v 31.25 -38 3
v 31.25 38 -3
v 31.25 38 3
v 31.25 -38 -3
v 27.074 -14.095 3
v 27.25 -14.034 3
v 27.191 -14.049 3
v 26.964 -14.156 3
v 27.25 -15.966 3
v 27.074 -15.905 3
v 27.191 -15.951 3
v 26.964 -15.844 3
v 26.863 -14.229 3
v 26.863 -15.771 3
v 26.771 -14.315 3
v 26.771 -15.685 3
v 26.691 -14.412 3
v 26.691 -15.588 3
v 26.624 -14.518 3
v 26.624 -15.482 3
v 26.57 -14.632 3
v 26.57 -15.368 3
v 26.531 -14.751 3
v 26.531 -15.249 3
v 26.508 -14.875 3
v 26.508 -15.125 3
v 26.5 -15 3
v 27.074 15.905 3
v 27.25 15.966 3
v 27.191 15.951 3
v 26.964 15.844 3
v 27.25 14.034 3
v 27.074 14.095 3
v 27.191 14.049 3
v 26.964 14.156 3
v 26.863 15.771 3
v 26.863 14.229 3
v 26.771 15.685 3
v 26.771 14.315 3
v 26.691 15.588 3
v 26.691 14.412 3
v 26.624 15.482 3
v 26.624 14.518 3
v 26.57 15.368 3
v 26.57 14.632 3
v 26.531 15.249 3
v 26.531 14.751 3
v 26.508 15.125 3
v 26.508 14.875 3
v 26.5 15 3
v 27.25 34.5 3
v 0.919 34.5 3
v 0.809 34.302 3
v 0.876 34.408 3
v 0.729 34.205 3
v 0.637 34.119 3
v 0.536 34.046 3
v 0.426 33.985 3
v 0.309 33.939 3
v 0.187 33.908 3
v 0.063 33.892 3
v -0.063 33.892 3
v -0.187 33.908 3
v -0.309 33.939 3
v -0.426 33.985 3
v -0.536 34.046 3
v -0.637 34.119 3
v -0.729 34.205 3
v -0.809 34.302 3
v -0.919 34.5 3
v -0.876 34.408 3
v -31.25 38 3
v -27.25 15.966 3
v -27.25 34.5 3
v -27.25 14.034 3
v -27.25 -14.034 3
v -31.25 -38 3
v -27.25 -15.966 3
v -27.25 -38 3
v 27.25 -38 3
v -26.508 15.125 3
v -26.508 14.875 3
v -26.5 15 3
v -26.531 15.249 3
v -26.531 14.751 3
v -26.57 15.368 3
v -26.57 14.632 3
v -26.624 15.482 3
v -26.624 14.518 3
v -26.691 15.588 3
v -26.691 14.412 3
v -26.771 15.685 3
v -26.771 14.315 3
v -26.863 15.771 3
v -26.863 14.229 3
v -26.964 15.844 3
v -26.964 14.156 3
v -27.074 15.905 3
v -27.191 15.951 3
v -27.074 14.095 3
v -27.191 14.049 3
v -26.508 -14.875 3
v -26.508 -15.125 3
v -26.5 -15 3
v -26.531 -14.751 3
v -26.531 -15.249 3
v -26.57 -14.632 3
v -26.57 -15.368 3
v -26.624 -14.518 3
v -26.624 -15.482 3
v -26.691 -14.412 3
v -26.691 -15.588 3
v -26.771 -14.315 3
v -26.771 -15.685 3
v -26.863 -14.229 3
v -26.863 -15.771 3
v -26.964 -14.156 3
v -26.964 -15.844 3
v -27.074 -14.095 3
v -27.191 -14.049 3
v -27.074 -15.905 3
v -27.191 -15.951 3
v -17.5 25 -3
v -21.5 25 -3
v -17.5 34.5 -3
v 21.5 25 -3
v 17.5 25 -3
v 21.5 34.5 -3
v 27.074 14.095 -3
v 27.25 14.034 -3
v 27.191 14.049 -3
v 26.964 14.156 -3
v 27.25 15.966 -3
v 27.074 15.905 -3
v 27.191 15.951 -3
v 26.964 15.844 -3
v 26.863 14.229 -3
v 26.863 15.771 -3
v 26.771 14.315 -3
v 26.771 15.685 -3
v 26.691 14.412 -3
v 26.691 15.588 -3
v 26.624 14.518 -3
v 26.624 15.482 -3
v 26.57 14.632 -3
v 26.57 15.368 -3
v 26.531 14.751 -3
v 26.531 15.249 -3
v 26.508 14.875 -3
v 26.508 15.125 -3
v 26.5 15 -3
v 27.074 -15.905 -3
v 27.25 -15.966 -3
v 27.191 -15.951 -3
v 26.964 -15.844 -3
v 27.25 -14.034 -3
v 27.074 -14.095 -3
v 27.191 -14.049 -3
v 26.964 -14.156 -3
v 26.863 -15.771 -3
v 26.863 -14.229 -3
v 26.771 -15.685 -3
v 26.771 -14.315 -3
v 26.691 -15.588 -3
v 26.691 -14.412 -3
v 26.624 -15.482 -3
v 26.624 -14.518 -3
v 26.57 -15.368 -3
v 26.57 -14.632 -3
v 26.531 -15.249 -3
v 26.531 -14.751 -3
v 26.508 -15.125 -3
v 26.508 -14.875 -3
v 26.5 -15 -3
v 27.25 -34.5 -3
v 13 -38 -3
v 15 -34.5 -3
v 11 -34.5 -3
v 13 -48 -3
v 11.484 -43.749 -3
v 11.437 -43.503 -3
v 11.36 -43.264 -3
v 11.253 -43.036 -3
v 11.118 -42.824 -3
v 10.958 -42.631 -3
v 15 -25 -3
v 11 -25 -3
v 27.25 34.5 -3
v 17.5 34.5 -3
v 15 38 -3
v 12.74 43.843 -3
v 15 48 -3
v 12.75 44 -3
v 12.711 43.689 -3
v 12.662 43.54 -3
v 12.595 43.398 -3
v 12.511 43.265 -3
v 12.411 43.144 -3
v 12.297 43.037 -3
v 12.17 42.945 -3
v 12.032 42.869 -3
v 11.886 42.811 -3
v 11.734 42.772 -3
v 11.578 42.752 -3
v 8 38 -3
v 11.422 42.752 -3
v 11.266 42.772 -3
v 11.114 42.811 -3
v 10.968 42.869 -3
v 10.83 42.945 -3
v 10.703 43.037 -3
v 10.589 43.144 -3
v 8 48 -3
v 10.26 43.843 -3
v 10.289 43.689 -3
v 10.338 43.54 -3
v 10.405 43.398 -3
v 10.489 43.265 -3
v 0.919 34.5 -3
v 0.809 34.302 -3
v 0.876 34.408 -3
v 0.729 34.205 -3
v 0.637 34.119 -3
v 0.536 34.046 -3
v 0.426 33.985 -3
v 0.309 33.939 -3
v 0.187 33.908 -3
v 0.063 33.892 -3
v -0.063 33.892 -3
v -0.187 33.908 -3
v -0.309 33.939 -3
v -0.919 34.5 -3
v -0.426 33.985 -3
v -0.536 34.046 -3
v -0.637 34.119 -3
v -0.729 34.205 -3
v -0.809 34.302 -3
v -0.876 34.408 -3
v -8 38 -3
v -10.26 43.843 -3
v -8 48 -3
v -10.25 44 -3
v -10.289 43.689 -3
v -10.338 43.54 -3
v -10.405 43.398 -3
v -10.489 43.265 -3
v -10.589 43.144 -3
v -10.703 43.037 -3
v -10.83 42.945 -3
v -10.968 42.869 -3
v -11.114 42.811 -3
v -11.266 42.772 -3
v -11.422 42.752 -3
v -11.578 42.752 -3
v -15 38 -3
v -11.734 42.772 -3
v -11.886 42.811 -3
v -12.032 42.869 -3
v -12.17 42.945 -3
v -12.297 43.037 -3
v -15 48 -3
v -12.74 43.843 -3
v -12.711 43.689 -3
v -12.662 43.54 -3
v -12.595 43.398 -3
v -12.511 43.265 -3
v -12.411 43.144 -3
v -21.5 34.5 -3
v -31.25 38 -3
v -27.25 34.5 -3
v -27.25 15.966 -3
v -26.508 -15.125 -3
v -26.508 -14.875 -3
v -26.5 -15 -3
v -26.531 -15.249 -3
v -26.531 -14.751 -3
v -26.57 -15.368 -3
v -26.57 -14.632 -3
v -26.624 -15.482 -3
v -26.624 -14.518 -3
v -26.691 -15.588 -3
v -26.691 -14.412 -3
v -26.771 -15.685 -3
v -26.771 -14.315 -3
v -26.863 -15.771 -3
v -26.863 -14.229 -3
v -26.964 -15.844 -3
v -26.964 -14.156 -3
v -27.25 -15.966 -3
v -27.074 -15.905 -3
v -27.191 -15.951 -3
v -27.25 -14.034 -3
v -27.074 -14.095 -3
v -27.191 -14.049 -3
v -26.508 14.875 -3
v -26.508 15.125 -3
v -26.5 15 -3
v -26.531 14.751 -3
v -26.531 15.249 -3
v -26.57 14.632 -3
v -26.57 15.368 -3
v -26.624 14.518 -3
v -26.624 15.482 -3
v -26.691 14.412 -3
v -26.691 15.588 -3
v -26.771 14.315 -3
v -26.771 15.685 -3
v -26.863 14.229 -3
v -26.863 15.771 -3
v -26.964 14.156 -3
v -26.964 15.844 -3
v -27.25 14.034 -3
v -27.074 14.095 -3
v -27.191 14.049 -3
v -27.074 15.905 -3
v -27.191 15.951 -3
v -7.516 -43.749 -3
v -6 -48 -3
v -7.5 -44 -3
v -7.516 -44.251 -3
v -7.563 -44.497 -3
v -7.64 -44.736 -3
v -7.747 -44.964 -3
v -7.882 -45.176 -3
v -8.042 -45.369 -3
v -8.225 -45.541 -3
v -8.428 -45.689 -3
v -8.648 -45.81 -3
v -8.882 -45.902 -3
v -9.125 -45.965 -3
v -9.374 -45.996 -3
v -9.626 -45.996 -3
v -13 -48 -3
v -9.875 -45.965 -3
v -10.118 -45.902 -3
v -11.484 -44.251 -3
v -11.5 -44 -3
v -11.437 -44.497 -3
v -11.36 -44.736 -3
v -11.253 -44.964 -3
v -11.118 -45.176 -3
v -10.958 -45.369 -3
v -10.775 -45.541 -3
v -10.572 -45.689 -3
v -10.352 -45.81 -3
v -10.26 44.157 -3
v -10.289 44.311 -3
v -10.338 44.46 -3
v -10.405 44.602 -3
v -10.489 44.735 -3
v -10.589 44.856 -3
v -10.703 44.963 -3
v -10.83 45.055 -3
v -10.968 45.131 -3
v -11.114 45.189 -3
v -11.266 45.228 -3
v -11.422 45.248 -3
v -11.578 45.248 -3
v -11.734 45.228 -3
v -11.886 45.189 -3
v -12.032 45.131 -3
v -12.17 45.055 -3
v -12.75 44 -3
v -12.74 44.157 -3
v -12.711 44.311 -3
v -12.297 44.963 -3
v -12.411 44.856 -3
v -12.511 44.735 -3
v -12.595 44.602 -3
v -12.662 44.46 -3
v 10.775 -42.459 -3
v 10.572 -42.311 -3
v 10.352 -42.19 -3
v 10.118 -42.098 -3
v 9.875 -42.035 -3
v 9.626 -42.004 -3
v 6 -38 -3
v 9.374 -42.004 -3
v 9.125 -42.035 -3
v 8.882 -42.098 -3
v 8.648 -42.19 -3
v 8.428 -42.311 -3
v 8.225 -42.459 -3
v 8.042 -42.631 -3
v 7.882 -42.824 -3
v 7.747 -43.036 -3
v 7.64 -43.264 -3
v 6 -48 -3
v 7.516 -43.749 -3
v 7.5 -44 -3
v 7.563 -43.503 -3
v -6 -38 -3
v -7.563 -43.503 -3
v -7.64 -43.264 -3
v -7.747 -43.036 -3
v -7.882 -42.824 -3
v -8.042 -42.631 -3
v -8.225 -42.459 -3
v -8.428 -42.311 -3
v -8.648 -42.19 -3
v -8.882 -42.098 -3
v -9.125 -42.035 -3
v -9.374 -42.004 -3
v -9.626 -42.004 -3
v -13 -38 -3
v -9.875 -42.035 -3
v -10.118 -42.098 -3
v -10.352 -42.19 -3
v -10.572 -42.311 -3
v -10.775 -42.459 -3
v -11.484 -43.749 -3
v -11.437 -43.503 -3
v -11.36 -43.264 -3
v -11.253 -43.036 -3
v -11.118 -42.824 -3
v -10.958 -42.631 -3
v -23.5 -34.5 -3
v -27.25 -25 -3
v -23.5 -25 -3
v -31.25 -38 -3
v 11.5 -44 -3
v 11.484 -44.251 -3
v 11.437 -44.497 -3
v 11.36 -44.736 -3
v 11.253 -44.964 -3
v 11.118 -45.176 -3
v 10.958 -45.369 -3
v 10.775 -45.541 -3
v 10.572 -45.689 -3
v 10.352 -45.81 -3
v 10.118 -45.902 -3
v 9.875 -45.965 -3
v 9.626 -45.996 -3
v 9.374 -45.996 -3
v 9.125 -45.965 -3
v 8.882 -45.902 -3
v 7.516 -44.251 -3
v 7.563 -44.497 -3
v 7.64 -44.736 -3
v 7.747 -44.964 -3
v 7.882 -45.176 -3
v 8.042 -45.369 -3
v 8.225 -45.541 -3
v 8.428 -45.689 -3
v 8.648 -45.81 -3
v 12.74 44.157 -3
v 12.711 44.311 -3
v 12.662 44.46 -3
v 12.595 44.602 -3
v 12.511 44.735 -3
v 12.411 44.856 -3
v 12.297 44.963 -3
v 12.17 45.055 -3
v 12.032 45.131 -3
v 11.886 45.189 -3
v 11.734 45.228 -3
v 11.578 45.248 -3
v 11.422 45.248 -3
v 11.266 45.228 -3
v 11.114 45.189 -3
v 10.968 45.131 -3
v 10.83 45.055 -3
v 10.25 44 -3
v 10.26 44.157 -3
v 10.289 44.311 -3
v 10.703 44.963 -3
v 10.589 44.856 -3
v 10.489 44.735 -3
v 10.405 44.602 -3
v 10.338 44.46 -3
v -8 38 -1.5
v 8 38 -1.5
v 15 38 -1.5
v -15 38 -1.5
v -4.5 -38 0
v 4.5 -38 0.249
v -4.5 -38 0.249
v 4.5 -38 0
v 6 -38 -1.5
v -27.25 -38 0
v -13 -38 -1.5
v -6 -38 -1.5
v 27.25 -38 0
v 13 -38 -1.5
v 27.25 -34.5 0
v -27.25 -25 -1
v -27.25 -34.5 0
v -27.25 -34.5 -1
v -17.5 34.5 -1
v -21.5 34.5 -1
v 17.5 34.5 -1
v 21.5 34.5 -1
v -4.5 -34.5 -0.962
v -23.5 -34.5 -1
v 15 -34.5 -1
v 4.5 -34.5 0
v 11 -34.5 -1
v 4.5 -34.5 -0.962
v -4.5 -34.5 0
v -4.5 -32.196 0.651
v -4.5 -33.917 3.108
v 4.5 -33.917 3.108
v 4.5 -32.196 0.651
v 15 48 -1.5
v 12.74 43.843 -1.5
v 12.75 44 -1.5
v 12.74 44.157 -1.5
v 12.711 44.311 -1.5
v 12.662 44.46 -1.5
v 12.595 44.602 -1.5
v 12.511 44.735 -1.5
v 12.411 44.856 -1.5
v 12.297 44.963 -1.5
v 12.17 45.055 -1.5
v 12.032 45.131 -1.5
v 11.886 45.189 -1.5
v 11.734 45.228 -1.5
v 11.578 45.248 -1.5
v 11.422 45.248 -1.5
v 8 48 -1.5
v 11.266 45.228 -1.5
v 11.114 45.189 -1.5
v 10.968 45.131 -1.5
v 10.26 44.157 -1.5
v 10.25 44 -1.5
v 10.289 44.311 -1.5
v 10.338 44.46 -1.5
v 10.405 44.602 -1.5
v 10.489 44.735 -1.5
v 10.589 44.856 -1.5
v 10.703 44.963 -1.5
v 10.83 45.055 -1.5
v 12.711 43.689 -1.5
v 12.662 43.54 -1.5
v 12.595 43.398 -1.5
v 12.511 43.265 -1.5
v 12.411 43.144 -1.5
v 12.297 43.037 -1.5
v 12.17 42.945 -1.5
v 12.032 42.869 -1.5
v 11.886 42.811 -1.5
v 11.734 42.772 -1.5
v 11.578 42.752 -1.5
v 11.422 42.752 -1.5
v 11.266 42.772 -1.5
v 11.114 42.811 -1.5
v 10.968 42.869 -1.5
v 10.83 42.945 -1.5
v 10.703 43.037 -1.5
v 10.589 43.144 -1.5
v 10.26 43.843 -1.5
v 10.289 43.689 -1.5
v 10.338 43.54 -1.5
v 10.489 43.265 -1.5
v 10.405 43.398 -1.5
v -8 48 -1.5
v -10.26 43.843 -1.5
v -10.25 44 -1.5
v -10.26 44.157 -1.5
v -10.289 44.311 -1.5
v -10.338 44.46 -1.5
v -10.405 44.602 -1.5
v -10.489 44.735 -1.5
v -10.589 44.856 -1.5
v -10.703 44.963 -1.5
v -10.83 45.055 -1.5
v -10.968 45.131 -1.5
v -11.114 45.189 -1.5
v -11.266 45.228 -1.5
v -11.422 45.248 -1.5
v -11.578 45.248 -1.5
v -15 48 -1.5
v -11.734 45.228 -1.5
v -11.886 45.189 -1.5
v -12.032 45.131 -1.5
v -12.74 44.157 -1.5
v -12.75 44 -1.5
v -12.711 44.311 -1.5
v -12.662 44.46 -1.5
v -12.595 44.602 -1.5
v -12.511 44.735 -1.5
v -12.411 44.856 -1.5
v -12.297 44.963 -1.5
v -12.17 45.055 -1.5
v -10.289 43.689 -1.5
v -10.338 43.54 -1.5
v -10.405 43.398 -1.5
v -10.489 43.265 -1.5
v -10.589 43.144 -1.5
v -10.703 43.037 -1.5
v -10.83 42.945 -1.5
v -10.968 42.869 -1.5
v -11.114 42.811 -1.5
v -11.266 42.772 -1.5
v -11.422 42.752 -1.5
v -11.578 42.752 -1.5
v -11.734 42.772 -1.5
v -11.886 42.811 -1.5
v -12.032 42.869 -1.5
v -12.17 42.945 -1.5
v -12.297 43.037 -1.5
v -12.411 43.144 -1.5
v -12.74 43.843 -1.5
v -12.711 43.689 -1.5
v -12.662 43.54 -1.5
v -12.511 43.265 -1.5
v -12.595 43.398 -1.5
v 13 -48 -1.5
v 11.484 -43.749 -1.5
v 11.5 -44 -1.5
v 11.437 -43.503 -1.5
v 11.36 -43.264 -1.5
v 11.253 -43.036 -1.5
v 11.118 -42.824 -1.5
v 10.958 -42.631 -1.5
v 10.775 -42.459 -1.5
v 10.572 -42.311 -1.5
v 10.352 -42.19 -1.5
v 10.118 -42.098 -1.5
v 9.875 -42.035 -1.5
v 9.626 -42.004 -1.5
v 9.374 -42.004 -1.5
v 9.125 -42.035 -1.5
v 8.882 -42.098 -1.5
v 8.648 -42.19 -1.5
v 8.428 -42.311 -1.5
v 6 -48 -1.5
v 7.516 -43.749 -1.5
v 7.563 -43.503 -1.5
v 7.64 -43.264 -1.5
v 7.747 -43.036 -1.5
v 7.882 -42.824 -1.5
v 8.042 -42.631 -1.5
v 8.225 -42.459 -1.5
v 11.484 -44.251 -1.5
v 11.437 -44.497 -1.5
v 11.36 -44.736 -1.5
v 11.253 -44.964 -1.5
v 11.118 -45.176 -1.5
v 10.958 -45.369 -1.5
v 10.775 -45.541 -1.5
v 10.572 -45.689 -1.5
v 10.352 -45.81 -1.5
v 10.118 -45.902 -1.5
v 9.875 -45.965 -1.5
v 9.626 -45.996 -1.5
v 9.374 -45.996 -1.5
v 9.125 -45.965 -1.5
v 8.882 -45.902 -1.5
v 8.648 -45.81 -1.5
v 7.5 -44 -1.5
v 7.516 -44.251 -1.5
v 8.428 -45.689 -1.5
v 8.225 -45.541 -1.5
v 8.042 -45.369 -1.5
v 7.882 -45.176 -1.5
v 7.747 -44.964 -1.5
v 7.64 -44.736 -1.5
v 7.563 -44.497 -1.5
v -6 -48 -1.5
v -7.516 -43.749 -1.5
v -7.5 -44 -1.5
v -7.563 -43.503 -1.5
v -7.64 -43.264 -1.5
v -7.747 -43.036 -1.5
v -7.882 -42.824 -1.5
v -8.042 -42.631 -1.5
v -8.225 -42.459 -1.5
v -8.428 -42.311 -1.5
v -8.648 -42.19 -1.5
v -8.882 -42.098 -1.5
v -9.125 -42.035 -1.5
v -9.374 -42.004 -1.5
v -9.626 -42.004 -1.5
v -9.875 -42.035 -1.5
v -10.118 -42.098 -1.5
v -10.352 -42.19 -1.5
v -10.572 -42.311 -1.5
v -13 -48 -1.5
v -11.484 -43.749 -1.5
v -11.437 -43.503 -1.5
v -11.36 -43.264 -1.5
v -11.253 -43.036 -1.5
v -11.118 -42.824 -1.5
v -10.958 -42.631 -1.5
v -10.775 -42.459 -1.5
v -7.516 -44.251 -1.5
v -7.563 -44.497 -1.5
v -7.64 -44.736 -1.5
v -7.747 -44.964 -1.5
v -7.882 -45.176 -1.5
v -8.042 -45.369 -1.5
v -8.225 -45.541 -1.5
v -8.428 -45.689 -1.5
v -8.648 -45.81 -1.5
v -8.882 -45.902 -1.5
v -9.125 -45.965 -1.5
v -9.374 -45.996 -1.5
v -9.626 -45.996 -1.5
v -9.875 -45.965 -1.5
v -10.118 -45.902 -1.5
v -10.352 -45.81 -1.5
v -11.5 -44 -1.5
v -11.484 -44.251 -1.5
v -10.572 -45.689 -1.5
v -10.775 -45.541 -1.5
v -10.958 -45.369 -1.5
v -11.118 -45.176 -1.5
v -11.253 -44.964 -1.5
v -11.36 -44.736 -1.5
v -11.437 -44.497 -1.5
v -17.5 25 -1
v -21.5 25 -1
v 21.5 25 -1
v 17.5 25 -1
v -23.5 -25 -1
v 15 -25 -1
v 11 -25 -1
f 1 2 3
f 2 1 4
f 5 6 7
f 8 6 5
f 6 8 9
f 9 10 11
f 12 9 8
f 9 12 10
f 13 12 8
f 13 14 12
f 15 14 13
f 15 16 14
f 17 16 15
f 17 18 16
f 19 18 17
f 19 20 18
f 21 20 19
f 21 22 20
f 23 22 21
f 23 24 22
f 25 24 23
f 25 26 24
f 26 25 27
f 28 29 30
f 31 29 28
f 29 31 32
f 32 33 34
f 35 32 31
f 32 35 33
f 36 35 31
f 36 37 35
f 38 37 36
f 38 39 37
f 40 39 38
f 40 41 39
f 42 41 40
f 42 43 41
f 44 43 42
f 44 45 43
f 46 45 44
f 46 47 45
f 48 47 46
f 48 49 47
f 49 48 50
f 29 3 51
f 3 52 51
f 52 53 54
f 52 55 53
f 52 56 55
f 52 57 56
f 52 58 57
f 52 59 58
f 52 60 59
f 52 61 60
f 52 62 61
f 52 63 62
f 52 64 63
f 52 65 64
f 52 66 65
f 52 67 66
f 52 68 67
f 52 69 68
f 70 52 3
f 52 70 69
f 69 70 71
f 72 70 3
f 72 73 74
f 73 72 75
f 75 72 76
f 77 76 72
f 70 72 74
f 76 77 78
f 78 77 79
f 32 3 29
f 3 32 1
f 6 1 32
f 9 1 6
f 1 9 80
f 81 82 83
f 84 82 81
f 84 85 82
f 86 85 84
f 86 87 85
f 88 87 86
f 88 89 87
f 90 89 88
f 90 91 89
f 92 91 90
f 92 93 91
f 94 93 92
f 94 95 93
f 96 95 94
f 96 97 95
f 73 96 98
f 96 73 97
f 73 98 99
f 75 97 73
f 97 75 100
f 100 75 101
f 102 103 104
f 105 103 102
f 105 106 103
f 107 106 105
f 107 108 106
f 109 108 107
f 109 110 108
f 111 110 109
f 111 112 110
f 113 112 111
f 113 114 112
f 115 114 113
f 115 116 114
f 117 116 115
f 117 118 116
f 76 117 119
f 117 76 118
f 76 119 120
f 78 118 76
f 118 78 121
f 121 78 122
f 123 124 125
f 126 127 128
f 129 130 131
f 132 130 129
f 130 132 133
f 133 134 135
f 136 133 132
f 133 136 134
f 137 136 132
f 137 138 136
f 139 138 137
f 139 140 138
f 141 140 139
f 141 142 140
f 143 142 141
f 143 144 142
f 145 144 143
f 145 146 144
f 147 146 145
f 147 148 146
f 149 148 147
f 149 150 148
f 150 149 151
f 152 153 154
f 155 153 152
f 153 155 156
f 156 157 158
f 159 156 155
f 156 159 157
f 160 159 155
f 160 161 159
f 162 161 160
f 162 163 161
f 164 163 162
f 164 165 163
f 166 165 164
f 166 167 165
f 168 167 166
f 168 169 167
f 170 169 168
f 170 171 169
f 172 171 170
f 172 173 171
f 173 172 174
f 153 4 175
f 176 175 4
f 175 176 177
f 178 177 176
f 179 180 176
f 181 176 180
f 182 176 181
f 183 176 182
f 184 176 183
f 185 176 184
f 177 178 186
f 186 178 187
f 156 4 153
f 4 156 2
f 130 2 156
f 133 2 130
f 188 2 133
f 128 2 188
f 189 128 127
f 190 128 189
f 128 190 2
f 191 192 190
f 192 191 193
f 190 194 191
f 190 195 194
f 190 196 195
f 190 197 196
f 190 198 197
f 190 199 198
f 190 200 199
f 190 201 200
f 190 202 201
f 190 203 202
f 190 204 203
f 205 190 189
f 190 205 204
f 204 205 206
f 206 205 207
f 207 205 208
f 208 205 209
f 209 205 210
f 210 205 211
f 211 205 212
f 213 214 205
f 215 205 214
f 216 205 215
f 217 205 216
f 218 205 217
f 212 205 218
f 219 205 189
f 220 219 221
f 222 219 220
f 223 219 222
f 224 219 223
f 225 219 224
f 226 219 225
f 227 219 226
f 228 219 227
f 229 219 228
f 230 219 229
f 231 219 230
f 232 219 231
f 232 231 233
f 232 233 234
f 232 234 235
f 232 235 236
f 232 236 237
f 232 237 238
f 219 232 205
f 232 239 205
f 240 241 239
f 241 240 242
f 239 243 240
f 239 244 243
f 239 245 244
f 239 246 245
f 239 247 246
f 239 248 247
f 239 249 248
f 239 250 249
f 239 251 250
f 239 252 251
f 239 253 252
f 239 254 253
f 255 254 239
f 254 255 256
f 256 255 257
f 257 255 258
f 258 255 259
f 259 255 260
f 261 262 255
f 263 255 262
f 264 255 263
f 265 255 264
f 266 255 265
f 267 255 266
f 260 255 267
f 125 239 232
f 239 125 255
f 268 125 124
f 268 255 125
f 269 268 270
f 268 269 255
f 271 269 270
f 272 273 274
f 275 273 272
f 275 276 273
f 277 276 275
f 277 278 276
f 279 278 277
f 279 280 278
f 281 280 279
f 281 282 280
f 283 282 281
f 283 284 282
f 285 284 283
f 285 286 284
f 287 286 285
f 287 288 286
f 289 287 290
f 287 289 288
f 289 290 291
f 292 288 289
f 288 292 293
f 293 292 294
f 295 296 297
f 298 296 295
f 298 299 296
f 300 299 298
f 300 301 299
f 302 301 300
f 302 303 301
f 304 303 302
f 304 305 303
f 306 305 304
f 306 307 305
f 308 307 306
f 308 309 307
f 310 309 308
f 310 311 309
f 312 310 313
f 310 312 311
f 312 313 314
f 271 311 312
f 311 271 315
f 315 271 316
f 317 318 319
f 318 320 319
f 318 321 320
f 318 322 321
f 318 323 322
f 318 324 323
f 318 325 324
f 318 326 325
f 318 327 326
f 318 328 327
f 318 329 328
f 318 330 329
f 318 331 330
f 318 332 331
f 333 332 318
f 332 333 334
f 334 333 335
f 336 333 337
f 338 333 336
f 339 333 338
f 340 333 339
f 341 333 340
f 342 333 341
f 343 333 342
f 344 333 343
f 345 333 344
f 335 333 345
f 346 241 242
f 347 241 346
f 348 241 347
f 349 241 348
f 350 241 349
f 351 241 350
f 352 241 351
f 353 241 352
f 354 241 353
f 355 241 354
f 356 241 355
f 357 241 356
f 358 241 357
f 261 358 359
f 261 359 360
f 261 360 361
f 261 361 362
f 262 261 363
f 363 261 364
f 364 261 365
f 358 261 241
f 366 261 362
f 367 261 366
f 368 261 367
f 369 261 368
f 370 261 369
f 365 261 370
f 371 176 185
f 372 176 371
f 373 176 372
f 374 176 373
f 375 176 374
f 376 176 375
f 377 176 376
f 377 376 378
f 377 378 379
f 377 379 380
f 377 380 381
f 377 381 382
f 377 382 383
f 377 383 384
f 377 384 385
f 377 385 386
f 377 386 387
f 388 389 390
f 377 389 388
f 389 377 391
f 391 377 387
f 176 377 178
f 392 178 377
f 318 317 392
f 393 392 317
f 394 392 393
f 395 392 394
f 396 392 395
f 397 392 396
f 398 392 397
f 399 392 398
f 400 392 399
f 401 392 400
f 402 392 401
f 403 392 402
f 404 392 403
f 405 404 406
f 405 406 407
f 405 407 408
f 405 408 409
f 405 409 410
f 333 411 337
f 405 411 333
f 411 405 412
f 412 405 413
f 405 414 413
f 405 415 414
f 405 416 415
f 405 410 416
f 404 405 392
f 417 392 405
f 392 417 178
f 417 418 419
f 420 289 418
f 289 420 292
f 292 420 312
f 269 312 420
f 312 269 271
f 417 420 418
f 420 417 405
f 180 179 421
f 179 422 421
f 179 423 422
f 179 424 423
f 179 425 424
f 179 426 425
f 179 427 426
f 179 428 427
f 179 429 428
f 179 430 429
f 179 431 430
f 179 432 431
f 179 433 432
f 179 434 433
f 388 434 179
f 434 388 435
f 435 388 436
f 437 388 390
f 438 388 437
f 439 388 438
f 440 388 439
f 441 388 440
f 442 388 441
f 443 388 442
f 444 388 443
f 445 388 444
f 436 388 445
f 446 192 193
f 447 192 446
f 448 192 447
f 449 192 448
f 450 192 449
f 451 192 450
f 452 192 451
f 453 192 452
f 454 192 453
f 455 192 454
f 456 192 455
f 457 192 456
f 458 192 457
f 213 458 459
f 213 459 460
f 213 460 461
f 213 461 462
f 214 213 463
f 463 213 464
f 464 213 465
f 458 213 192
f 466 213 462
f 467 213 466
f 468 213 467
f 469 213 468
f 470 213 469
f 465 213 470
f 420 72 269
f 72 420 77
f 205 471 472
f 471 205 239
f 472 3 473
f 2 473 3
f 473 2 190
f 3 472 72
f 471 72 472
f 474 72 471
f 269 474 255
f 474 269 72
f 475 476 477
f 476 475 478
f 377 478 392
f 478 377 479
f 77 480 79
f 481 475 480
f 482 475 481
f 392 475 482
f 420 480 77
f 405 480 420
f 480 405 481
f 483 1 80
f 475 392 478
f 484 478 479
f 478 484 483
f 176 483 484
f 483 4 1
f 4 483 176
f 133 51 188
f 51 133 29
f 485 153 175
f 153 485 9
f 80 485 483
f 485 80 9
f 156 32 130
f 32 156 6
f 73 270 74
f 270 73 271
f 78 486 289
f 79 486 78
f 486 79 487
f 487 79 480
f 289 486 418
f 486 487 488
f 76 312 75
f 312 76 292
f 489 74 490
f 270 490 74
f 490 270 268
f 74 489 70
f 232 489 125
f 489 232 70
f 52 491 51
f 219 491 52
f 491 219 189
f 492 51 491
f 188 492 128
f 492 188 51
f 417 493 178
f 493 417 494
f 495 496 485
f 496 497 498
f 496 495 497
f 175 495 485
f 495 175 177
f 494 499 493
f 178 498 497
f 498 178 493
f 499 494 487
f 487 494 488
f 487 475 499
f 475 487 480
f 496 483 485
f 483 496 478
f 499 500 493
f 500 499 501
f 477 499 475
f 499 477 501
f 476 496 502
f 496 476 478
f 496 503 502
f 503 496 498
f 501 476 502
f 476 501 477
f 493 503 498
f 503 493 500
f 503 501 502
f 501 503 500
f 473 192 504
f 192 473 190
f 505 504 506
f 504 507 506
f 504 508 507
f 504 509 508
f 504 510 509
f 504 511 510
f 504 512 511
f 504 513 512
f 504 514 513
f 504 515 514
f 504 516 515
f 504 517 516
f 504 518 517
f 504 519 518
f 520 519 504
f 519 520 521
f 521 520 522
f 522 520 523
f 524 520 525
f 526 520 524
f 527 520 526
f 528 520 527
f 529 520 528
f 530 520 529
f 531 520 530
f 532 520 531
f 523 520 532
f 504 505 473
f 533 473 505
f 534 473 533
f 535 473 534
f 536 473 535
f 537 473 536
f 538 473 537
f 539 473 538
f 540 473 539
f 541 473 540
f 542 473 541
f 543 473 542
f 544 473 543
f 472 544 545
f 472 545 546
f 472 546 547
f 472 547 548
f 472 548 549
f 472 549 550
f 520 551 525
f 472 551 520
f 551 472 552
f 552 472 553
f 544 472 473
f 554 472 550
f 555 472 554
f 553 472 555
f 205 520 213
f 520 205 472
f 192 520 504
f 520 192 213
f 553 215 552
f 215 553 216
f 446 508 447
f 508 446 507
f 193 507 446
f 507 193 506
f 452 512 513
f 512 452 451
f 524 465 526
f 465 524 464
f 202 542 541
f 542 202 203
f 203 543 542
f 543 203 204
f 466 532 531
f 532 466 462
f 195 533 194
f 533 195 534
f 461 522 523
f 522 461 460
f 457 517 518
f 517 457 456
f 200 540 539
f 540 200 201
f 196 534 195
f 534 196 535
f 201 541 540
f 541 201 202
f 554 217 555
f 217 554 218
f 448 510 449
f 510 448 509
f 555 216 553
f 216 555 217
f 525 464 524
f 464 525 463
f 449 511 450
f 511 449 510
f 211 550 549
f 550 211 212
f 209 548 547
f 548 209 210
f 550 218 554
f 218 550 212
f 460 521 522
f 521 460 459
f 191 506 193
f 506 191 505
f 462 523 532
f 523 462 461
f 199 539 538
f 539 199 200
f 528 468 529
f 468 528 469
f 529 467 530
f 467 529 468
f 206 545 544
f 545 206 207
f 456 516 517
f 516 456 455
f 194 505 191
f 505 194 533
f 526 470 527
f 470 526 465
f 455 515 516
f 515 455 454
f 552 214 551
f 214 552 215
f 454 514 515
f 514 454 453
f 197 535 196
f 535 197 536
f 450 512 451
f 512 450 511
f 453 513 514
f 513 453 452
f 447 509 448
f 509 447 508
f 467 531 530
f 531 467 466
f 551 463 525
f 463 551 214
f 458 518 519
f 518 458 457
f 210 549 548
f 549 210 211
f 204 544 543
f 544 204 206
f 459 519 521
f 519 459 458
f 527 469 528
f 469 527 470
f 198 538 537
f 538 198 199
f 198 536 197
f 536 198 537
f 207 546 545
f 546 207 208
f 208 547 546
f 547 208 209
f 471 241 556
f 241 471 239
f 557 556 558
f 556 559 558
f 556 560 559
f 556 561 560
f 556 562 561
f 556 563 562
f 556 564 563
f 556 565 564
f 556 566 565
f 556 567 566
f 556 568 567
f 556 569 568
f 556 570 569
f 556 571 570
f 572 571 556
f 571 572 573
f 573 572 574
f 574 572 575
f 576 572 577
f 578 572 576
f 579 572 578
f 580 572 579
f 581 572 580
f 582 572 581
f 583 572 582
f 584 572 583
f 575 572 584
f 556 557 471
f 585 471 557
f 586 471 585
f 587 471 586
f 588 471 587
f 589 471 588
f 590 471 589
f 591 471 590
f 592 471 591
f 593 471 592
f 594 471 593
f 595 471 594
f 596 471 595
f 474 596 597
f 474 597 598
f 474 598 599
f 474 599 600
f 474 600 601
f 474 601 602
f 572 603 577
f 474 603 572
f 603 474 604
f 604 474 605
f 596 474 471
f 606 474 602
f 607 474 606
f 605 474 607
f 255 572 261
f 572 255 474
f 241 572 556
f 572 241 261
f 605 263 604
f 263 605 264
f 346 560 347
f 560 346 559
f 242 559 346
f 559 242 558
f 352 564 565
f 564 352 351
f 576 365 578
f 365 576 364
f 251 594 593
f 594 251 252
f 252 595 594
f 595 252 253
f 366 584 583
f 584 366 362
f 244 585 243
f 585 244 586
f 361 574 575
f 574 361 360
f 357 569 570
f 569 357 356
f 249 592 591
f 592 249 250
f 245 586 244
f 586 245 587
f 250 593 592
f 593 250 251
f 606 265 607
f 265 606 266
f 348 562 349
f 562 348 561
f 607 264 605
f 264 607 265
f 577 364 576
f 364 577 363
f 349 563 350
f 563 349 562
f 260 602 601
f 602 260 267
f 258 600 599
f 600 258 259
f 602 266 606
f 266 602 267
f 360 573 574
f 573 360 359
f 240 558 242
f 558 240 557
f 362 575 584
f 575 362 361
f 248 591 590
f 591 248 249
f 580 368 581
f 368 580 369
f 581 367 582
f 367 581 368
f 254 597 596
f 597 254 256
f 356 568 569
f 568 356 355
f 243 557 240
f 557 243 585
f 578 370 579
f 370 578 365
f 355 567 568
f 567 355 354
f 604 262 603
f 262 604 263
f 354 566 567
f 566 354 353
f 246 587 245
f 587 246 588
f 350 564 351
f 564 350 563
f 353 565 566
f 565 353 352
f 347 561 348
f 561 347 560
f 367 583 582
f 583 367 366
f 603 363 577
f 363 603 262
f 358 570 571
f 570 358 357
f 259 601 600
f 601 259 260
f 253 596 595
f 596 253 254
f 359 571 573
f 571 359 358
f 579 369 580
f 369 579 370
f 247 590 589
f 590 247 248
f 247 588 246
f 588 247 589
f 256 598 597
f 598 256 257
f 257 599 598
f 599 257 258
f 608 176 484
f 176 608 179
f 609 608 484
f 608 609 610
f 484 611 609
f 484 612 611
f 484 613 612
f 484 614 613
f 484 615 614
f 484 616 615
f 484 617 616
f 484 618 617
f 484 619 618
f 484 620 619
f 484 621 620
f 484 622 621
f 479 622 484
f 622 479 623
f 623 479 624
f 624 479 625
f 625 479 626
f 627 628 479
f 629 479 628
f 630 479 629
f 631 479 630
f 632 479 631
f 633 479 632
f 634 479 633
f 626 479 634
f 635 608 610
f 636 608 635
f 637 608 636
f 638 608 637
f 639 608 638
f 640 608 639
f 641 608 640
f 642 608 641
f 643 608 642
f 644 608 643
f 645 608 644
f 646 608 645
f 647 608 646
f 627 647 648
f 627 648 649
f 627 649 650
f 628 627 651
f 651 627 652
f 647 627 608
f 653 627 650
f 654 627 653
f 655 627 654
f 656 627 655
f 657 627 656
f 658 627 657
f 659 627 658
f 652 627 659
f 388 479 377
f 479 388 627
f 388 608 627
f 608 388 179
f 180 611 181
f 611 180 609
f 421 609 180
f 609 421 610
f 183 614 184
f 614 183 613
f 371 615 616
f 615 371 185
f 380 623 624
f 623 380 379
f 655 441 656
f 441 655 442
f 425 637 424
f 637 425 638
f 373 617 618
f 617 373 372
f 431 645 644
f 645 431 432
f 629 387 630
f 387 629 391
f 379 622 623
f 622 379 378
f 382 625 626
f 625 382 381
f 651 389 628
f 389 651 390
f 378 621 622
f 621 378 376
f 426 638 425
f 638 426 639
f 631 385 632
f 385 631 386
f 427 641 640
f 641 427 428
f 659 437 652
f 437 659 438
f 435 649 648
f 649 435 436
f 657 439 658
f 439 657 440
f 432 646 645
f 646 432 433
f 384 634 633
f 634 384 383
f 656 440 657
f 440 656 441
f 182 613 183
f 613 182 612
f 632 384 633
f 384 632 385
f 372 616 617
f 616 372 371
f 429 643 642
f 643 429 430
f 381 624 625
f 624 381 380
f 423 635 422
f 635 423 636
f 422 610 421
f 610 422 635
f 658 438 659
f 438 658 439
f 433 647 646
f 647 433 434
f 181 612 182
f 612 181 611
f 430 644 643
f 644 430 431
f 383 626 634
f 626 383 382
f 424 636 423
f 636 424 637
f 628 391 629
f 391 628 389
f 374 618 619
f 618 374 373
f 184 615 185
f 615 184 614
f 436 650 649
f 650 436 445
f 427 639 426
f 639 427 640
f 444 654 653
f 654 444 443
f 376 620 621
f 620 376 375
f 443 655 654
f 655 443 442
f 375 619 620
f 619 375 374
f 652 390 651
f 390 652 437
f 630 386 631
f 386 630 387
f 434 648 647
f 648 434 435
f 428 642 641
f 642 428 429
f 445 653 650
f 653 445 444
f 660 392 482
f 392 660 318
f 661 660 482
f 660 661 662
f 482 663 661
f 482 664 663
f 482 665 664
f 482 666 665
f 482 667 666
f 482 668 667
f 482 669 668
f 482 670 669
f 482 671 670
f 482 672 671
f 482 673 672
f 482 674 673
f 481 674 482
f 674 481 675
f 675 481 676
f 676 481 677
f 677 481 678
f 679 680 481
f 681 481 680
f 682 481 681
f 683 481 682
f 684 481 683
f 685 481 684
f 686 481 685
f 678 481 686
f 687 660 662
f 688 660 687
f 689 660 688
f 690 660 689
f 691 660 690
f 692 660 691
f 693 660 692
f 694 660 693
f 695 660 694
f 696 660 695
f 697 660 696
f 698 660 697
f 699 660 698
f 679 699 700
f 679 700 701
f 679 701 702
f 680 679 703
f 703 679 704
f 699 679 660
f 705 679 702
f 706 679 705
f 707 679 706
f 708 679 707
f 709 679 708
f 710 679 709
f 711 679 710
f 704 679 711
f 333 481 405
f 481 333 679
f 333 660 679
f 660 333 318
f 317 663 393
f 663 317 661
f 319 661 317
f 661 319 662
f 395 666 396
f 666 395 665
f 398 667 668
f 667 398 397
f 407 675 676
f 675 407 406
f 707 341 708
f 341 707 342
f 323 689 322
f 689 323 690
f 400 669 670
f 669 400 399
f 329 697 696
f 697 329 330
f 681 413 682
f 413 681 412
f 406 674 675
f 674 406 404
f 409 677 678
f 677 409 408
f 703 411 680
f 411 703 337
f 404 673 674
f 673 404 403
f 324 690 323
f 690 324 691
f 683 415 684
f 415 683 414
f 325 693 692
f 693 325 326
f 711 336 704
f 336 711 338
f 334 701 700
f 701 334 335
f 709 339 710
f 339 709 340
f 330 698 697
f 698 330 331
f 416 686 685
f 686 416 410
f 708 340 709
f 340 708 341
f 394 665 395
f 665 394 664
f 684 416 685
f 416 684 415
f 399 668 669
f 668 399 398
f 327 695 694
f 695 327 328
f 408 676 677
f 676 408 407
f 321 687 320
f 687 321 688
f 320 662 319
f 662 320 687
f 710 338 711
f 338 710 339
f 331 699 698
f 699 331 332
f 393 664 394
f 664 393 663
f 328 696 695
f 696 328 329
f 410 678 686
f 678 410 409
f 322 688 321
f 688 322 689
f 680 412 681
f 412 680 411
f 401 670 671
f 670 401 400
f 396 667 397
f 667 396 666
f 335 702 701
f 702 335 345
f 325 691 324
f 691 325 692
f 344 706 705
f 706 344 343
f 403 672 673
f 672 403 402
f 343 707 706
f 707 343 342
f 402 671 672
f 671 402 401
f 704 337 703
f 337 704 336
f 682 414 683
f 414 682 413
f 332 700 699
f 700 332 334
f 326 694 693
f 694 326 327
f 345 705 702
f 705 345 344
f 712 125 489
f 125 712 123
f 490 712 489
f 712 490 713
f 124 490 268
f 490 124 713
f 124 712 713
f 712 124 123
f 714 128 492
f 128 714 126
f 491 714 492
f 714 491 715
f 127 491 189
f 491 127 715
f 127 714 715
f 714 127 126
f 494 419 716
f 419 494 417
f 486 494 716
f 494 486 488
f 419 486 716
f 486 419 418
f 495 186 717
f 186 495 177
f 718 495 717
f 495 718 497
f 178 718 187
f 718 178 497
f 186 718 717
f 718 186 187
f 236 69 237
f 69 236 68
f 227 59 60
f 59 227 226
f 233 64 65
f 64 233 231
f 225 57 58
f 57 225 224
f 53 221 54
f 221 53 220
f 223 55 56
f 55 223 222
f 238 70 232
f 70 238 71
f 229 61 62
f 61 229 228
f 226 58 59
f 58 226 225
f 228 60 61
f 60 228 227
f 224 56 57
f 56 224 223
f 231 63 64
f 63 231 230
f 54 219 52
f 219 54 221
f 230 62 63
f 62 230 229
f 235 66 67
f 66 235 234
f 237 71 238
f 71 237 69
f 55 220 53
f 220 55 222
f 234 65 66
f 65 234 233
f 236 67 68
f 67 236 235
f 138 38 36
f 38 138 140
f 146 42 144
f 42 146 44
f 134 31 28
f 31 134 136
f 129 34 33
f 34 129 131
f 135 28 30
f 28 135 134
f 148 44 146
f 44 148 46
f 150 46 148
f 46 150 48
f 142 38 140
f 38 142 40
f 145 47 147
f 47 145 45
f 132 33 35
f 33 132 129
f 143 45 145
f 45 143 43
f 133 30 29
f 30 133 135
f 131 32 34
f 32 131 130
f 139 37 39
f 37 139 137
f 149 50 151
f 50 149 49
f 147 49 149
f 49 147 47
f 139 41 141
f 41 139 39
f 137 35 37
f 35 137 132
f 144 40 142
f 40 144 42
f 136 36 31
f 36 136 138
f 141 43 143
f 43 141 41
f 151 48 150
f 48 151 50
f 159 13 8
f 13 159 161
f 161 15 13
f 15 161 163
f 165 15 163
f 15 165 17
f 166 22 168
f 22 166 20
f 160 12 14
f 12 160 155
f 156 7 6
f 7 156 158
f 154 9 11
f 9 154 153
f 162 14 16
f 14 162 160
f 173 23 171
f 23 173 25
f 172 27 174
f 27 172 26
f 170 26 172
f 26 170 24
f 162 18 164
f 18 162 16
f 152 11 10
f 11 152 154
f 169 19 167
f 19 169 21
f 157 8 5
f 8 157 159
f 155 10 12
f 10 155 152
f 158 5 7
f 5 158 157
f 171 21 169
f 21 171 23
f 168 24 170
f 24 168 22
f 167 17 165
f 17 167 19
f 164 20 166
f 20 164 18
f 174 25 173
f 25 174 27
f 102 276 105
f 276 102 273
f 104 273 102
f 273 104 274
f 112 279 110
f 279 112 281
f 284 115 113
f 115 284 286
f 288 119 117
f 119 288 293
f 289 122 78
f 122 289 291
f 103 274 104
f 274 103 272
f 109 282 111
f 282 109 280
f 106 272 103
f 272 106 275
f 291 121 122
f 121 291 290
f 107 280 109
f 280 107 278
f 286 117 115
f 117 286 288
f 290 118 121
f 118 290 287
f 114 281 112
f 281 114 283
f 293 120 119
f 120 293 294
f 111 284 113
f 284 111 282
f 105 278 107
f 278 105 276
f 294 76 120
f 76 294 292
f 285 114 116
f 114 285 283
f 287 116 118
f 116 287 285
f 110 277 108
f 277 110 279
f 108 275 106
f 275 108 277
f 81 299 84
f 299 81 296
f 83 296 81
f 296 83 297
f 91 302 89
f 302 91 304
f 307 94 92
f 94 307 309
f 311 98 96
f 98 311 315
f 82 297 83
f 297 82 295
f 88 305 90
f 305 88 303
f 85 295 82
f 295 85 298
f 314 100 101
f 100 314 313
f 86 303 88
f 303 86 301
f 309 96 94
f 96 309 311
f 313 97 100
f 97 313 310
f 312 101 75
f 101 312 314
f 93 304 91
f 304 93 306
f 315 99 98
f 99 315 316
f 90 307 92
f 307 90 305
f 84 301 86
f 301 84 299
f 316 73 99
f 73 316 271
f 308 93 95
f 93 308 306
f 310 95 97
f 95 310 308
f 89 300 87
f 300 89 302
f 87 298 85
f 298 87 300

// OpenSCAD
$fn = 50;
difference(){
	cube([62.5, 76, 6], center = true);
	translate([0, 0, 0]){
		cube([54.5, 69, 12], center = true);
	}
	translate([0, -36, 6]){
		cube([54.5, 6, 12], center = true);
	}
}

translate([-19.5, 30, -2]){
	cube([4, 10, 2], center = true);
}
translate([19.5, 30, -2]){
	cube([4, 10, 2], center = true);
}
translate([-25.5, -30, -2]){
	cube([4, 10, 2], center = true);
}
translate([13, -30, -2]){
	cube([4, 10, 2], center = true);
}
difference(){
	rotate([35,0,0]){
		translate([0, -29, 20.5]){
			cube([9, 6, 3], center = true);
		}
	}
	translate([0, -40.5, 0]){
		cube([10, 5, 10], center = true);
	}
}
translate([0, 34.89, 0]){
	cylinder(r = 1, h = 6, center = true);
}
translate([27.5, 15, 0]){
	cylinder(r = 1, h = 6, center = true);
}
translate([27.5, -15, 0]){
	cylinder(r = 1, h = 6, center = true);
}
translate([-27.5, -15, 0]){
	cylinder(r = 1, h = 6, center = true);
}
translate([-27.5, 15, 0]){
	cylinder(r = 1, h = 6, center = true);
}

translate([11.5, 42.5, -2.25]){
	difference(){
		cube([7,11,1.5], center = true);
		translate([0, 1.5, 0]){
			#cylinder(r = 1.25, h = 10, center = true);
		}
	}
}
translate([-11.5, 42.5, -2.25]){
	difference(){
		cube([7,11,1.5], center = true);
		translate([0, 1.5, 0]){
			#cylinder(r = 1.25, h = 10, center = true);
		}
	}
}
translate([9.5, -42.5, -2.25]){
	difference(){
		cube([7,11,1.5], center = true);
		translate([0, -1.5, 0]){
			#cylinder(r = 2, h = 10, center = true);
		}
	}
}
translate([-9.5, -42.5, -2.25]){
	difference(){
		cube([7,11,1.5], center = true);
		translate([0, -1.5, 0]){
			#cylinder(r = 2, h = 10, center = true);
		}
	}
}
